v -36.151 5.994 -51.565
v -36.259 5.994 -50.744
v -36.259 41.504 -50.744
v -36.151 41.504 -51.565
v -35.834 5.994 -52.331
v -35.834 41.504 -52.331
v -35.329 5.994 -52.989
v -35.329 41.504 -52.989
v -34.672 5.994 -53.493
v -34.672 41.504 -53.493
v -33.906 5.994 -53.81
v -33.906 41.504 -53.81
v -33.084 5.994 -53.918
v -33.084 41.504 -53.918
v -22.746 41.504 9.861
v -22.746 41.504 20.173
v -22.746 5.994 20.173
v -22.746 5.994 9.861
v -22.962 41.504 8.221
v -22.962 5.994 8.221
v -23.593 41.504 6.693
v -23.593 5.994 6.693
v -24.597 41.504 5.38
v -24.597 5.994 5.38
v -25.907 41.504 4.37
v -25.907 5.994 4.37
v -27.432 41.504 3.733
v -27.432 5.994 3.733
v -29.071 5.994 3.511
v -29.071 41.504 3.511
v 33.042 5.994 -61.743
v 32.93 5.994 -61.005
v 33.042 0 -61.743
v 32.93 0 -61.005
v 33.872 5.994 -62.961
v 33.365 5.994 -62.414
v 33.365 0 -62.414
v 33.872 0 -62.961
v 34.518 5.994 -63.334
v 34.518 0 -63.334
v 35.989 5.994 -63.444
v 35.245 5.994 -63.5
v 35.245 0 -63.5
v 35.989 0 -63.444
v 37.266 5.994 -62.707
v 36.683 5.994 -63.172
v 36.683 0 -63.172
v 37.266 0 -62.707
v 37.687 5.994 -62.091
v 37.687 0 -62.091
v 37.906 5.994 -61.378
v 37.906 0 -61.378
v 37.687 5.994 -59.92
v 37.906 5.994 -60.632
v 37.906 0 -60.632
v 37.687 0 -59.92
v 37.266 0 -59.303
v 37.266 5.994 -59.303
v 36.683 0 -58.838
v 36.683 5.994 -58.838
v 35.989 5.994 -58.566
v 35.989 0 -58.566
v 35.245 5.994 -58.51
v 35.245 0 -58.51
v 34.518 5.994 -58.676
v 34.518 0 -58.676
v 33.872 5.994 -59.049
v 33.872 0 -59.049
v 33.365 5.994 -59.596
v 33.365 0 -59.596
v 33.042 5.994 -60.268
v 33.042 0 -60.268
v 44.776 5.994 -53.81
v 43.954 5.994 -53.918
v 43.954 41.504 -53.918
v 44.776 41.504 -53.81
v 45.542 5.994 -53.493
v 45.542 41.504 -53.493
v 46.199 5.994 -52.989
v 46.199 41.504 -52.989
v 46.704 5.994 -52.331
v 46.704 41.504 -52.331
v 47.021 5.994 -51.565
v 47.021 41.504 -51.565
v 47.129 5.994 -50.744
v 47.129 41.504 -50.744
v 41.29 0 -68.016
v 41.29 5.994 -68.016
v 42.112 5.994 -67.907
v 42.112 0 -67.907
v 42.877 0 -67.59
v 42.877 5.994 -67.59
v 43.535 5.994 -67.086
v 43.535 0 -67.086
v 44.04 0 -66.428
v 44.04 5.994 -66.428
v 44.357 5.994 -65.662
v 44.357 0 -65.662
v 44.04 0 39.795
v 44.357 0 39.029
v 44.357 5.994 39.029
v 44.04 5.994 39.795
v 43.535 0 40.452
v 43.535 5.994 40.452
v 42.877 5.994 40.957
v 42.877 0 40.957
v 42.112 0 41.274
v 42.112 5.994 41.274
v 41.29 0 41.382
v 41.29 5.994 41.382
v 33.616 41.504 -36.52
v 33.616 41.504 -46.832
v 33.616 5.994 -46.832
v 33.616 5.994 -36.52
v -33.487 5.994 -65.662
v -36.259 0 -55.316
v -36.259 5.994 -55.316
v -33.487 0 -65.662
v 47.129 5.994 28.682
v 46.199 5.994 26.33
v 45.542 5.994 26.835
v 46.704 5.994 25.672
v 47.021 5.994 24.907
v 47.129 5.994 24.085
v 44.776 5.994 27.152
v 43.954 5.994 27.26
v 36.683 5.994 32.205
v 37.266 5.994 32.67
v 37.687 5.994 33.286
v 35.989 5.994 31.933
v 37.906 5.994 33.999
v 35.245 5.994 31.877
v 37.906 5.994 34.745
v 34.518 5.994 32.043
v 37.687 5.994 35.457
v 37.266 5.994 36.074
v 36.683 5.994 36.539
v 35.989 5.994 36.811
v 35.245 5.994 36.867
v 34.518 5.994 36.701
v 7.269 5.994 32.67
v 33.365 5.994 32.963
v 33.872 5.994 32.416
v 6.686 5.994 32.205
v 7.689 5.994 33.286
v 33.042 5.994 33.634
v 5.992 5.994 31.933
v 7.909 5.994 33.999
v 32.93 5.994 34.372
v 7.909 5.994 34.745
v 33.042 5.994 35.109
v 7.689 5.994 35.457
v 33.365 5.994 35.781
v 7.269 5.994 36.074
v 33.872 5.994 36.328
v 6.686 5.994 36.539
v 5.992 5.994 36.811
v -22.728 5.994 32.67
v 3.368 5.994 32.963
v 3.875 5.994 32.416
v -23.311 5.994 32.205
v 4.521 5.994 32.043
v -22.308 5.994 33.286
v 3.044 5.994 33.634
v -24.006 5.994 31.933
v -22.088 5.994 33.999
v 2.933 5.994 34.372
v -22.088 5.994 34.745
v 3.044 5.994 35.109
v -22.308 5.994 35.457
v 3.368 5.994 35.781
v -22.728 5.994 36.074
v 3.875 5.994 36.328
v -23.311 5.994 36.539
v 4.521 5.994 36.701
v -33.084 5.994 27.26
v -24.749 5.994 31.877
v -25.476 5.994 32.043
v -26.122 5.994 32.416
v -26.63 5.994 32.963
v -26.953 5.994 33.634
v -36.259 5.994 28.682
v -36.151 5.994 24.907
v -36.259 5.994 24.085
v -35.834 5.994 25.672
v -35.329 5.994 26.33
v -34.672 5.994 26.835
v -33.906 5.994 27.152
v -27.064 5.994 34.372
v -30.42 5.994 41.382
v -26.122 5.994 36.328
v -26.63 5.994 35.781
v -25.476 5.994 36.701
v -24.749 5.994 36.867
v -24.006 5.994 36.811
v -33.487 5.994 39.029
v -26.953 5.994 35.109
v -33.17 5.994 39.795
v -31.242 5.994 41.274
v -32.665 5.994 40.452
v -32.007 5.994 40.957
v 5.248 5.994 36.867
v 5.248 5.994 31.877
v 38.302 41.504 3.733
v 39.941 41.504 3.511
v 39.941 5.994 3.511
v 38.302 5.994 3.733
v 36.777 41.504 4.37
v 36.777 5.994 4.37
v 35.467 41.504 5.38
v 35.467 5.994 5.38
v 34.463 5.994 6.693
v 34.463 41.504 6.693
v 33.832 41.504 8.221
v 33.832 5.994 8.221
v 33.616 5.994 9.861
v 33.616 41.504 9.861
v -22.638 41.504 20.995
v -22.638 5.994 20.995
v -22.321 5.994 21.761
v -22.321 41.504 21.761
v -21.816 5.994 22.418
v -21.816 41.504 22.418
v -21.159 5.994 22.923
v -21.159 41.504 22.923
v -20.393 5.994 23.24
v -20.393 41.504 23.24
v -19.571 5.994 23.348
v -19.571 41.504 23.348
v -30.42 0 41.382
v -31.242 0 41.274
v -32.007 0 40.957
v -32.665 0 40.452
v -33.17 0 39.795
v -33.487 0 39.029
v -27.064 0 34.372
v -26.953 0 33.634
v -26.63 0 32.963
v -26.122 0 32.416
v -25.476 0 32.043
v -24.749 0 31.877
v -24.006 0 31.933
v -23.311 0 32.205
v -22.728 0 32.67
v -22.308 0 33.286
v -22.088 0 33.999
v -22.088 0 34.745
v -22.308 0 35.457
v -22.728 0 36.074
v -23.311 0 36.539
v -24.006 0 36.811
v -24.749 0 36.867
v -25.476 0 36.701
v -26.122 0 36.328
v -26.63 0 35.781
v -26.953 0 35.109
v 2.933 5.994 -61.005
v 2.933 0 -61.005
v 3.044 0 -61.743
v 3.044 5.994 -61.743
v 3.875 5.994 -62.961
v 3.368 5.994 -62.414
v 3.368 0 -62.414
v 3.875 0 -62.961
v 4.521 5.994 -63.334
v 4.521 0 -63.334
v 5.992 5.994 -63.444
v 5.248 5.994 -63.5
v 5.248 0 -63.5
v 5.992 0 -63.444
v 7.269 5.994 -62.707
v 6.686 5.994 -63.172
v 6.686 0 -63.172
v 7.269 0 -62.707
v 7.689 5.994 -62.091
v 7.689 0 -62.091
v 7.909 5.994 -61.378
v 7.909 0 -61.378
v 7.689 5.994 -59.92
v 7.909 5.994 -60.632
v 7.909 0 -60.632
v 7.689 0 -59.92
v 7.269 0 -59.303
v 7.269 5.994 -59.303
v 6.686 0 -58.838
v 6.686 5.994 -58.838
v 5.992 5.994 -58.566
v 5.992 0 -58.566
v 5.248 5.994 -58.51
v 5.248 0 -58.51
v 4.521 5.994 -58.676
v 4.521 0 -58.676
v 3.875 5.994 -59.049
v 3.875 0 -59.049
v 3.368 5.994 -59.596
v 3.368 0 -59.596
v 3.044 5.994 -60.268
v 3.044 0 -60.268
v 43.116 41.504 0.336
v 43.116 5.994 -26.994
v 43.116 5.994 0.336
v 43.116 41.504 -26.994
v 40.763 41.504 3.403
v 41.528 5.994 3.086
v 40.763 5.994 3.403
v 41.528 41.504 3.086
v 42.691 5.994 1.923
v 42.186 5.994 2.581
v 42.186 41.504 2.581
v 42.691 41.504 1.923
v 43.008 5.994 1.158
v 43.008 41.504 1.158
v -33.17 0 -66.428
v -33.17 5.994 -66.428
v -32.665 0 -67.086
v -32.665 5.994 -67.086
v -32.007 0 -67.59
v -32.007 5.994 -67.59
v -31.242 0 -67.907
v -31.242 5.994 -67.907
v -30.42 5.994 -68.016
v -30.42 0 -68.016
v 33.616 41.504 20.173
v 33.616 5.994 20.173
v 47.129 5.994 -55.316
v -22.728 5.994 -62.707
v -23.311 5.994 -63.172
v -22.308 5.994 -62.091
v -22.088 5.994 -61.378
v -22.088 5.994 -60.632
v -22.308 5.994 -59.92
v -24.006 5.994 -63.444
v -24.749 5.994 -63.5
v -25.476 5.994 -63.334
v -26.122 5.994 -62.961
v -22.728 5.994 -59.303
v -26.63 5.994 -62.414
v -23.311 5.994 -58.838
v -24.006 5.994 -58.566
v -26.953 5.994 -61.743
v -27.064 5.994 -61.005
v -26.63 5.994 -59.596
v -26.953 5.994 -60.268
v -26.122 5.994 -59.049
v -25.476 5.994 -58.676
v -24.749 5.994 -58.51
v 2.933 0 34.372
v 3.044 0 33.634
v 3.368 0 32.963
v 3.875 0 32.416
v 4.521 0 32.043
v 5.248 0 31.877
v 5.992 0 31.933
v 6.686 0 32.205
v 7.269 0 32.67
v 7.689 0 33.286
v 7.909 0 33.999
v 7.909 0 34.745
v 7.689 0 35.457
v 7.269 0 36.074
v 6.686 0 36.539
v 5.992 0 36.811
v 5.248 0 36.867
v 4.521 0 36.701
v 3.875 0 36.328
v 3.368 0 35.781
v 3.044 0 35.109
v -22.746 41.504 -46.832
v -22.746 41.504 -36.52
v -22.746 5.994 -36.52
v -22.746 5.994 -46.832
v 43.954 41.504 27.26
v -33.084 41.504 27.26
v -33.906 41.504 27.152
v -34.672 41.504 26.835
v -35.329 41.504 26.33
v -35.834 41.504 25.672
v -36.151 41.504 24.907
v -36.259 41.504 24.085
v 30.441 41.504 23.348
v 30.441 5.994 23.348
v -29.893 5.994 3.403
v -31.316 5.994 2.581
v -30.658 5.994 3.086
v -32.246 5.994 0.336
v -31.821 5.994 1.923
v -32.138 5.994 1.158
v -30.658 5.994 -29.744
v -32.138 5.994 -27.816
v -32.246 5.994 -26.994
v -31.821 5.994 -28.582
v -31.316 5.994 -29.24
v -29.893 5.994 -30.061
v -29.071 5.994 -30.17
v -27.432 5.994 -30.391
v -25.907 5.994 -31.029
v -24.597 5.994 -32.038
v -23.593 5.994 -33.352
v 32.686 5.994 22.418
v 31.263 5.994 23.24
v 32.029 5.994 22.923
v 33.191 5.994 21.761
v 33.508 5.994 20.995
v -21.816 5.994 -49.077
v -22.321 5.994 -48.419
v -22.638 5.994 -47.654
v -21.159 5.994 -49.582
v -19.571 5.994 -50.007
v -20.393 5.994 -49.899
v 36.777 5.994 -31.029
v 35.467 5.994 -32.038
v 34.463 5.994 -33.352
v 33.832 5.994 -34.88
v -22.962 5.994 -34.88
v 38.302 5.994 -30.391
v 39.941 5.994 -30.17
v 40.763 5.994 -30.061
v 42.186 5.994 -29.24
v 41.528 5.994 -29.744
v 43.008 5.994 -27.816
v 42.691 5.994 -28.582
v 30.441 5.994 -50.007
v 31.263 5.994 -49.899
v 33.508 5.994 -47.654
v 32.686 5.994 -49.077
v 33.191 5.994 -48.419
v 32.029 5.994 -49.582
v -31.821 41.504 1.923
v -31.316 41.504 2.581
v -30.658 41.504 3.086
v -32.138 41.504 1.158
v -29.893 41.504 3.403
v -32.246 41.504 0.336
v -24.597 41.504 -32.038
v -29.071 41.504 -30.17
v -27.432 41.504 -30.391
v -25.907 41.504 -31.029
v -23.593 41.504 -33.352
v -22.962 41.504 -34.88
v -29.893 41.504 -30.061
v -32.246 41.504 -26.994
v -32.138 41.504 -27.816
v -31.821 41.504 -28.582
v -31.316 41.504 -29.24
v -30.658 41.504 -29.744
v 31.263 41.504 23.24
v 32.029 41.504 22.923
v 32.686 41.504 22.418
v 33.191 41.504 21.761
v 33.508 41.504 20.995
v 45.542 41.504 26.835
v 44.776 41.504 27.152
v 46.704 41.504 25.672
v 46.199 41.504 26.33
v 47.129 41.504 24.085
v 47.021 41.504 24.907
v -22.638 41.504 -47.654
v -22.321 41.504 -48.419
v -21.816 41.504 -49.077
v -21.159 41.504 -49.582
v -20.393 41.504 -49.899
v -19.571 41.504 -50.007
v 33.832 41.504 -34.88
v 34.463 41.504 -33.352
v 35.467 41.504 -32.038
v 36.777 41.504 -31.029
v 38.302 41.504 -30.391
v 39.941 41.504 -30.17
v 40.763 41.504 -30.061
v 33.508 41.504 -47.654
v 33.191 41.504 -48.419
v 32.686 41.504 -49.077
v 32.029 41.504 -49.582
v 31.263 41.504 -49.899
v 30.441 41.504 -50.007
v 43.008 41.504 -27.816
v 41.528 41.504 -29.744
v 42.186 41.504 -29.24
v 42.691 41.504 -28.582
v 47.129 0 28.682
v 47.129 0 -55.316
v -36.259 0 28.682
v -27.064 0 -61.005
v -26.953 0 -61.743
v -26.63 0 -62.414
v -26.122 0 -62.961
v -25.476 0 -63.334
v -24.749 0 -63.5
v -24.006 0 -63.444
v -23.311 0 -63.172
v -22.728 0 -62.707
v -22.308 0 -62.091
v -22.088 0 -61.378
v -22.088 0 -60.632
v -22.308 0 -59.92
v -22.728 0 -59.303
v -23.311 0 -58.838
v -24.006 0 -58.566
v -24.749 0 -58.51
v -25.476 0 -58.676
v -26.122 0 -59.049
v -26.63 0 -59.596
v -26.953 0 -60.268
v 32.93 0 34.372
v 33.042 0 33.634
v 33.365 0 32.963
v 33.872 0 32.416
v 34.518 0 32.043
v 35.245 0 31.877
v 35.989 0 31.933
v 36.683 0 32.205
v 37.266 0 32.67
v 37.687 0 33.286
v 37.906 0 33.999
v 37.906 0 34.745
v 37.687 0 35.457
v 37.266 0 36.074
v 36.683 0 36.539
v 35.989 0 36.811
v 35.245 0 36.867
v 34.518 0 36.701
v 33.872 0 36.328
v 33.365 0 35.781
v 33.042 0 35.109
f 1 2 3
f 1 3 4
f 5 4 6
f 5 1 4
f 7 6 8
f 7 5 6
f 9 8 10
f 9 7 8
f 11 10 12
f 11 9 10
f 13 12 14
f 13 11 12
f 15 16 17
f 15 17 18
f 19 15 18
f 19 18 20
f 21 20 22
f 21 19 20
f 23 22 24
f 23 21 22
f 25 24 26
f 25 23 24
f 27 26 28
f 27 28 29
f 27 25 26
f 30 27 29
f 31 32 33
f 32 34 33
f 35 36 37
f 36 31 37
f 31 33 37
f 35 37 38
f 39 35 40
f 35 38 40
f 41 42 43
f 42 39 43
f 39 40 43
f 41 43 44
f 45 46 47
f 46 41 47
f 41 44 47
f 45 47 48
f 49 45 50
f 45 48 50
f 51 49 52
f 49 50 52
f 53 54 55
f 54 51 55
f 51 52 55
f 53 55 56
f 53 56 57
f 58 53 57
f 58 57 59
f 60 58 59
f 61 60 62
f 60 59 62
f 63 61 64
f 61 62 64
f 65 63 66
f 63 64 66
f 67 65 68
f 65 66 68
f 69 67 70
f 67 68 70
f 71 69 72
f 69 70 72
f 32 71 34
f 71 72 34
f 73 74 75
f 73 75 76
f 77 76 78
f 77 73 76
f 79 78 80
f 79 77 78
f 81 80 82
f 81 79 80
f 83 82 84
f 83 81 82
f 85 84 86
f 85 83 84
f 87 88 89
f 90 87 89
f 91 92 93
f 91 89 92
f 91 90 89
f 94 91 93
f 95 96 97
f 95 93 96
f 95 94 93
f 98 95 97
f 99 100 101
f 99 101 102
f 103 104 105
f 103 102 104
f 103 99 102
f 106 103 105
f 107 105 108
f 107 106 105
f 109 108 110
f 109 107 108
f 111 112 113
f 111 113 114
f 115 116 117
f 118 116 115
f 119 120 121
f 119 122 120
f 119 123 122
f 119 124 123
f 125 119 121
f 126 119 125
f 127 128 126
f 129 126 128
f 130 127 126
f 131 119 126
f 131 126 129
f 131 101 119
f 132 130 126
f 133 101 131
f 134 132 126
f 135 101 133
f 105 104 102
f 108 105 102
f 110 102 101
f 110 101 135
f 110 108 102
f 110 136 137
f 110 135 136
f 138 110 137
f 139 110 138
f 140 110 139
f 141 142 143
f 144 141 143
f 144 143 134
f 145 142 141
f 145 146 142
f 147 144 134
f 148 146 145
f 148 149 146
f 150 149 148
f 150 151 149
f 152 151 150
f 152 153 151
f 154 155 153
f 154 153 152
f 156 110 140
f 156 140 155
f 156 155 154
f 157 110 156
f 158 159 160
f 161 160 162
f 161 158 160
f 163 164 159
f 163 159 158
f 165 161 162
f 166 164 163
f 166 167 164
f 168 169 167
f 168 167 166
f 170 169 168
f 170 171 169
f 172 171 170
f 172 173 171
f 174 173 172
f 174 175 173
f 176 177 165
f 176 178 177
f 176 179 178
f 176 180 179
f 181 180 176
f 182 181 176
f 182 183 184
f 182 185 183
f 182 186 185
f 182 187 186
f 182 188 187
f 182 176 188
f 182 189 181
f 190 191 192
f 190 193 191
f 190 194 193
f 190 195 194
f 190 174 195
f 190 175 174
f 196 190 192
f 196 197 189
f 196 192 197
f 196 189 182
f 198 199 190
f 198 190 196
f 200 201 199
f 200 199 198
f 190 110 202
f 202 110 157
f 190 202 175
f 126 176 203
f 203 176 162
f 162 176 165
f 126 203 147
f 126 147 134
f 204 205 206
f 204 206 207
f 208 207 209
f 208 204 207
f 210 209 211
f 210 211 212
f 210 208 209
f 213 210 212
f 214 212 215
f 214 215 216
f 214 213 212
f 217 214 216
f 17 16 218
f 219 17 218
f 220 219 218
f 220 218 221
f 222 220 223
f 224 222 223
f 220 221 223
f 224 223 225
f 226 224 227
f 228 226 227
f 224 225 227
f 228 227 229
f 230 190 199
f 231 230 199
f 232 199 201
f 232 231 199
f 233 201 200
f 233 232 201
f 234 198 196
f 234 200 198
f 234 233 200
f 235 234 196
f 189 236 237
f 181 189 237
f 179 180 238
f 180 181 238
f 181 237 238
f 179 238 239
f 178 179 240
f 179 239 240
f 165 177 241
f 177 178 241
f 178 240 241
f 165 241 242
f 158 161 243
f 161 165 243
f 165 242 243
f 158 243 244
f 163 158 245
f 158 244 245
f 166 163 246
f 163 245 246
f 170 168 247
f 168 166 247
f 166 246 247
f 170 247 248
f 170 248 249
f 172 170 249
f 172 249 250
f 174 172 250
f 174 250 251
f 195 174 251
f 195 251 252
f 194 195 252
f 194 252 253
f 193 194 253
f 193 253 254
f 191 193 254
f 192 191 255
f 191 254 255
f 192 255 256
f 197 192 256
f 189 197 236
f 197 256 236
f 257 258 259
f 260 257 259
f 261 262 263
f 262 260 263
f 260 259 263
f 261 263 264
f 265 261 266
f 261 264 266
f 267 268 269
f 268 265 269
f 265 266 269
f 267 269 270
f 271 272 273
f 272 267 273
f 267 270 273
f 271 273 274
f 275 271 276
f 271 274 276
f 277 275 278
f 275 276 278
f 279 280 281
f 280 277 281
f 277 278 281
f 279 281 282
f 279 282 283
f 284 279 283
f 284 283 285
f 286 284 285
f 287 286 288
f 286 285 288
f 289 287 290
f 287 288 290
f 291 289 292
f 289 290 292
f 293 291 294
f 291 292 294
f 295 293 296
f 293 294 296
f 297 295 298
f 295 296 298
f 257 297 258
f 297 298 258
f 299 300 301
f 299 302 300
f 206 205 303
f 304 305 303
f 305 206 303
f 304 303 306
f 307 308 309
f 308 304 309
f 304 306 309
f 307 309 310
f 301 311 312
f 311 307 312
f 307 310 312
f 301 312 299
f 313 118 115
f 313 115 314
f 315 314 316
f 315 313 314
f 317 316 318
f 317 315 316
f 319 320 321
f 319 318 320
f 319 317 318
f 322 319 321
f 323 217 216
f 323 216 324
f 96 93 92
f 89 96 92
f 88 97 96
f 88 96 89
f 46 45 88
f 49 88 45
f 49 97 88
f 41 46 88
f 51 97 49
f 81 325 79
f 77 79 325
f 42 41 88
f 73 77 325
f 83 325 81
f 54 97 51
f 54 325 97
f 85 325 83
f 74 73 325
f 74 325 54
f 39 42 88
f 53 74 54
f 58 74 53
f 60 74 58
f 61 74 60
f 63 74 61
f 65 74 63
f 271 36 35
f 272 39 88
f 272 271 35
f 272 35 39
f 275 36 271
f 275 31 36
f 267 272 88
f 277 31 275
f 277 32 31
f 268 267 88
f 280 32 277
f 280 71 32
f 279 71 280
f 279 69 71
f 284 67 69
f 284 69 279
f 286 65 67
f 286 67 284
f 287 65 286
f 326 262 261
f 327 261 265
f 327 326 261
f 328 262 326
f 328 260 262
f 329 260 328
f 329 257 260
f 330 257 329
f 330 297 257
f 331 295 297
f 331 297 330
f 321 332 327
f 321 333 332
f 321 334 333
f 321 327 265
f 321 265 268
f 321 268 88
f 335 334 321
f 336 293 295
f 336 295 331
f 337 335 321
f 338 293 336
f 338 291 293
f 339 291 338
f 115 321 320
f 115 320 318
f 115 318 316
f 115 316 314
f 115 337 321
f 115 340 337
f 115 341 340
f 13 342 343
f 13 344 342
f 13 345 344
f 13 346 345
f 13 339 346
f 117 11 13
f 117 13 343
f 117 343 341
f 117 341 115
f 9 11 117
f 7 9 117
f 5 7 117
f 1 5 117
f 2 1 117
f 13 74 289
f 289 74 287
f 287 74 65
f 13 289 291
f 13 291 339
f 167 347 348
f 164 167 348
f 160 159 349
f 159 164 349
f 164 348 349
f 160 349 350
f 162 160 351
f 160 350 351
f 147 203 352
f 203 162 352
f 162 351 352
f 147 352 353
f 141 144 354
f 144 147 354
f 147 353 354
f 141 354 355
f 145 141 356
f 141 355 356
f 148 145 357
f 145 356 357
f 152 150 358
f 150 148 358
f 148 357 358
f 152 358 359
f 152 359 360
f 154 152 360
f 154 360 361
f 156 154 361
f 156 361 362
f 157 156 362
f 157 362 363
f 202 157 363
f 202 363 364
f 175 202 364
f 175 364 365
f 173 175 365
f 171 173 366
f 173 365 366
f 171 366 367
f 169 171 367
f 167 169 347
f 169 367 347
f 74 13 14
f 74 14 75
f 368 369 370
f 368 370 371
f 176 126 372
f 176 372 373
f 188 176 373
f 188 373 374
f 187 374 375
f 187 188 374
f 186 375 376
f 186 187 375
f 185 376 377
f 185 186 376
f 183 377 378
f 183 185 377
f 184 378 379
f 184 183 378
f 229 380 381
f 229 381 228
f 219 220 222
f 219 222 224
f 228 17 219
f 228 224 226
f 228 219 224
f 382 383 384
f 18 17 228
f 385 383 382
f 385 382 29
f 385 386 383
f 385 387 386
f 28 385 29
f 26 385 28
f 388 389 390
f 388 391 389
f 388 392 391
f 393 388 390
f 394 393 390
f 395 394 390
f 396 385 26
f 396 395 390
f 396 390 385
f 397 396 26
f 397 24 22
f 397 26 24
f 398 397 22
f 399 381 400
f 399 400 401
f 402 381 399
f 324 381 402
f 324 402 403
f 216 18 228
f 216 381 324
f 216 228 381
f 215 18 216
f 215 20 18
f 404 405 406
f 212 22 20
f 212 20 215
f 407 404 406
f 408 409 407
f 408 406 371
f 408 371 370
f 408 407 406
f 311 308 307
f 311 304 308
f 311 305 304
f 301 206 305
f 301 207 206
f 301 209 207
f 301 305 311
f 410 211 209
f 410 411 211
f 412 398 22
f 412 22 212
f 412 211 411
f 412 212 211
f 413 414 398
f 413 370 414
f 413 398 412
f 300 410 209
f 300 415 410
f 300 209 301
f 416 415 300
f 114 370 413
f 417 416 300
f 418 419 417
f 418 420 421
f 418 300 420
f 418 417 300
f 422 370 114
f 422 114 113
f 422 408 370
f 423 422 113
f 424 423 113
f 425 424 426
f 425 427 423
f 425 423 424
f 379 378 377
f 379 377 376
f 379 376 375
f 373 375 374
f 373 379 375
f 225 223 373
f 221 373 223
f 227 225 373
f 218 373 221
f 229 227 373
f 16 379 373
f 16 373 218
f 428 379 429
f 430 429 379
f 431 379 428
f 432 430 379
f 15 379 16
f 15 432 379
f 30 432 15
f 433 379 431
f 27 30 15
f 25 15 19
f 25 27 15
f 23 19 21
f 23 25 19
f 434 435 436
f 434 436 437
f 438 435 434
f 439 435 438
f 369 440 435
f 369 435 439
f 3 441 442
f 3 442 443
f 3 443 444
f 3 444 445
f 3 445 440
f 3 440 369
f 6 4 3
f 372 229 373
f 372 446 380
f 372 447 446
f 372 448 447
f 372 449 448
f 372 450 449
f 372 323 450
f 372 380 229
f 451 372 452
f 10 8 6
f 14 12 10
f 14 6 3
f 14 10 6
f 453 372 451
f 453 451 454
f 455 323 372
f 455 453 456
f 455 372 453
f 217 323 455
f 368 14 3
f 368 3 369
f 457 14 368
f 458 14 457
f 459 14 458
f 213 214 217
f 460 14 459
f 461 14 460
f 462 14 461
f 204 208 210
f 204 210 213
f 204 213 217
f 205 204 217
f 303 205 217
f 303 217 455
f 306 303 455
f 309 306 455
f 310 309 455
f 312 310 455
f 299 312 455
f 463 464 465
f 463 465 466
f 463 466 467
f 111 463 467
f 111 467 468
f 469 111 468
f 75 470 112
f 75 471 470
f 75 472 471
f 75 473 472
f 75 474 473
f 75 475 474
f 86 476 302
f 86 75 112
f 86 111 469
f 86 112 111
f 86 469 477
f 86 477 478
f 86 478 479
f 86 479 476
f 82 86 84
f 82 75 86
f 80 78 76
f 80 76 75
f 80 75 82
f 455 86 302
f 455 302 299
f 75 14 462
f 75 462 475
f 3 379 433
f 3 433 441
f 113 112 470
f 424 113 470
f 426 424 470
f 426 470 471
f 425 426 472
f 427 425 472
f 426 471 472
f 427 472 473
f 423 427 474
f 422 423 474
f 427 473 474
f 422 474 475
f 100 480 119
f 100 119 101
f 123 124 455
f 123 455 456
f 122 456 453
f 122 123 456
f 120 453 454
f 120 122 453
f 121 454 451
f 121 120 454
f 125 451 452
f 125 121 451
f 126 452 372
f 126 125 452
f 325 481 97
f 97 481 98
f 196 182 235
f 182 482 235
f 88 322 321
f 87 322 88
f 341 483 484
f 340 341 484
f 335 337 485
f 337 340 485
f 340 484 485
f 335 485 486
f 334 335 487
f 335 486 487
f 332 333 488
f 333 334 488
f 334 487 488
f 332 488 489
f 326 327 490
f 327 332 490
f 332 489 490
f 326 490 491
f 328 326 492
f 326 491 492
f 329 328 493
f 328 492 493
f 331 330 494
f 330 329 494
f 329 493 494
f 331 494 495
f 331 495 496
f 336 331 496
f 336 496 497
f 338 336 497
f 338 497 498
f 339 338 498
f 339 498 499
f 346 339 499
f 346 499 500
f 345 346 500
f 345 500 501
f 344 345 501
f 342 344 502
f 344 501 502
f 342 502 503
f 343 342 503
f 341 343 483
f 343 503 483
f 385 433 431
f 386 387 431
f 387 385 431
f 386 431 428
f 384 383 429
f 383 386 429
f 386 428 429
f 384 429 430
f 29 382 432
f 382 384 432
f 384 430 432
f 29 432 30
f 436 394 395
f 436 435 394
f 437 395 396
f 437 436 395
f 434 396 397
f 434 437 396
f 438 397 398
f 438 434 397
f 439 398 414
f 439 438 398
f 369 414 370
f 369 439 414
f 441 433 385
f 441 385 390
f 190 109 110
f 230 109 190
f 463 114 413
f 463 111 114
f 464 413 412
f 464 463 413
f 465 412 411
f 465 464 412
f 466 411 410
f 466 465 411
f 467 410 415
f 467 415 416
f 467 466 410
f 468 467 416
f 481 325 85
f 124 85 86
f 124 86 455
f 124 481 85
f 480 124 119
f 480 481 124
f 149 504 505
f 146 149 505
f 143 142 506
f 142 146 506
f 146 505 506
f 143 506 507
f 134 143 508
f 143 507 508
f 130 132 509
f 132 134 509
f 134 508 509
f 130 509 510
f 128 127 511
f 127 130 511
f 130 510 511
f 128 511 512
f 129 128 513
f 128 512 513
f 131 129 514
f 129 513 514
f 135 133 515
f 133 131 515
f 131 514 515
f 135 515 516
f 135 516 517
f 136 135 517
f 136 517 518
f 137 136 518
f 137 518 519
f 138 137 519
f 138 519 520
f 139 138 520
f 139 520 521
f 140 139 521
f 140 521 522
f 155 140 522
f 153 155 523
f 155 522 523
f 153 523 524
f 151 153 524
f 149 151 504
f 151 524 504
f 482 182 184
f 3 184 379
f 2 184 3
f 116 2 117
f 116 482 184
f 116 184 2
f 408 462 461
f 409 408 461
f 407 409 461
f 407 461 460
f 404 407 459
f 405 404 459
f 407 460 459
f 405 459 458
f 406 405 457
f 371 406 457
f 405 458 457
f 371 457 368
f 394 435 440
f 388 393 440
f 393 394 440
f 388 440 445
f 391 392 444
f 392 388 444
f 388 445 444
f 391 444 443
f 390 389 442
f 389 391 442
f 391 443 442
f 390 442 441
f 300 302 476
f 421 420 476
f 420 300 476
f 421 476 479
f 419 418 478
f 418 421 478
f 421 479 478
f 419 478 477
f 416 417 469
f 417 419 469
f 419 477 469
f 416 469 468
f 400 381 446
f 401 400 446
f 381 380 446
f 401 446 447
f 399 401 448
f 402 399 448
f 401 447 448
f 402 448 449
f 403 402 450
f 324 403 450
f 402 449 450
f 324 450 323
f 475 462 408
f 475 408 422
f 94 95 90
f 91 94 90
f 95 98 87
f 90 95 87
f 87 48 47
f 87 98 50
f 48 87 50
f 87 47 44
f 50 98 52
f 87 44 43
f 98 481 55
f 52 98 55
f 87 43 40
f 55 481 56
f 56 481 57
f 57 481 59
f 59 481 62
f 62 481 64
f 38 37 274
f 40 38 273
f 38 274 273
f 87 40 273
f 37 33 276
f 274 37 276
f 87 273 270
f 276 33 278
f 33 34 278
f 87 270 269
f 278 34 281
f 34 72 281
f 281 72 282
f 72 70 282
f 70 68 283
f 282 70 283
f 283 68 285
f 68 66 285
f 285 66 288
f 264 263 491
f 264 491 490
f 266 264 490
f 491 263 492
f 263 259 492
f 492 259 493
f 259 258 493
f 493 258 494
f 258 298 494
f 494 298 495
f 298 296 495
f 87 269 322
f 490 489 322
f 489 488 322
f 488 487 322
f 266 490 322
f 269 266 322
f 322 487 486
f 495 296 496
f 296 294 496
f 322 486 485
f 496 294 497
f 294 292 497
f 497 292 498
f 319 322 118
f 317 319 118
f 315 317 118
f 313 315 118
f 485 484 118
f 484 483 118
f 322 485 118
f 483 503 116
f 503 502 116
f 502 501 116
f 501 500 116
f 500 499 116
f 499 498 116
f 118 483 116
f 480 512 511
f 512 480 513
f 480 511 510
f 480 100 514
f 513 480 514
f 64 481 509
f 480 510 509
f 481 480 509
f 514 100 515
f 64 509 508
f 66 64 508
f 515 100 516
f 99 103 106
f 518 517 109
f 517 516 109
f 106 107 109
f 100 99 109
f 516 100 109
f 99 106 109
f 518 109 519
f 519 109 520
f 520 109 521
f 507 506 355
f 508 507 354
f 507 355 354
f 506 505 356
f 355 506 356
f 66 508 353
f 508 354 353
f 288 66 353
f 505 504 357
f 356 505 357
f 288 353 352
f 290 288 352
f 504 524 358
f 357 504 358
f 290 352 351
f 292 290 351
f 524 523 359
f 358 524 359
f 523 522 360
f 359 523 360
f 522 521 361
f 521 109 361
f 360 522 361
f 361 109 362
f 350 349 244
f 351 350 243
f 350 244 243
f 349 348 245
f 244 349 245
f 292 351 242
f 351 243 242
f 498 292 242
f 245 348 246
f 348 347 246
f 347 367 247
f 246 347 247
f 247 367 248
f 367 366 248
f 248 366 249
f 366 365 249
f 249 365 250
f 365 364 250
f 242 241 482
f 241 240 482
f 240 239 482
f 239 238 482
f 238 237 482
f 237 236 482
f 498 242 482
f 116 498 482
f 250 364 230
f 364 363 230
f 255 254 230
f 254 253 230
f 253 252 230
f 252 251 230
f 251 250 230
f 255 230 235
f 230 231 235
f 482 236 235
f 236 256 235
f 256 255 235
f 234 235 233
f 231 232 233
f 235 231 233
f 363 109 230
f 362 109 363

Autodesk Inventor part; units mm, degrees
ref_plane "YZ Plane" through (0, 0, 0) normal (1, 0, 0) x (0, 1, 0)
ref_plane "XZ Plane" through (0, 0, 0) normal (0, 1, 0) x (-1, 0, 0)
ref_plane "XY Plane" through (0, 0, 0) normal (0, 0, 1) x (1, 0, 0)
sketch "Sketch1" plane through (0, 0, 0) normal (0, 1, 0) x (-1, 0, 0)
  line L0 (-41.2899, 41.3823) -> (30.4199, 41.3823)
  line L1 (36.2591, 28.6823) -> (36.2591, -55.3155)
  line L2 (30.4199, -68.0155) -> (-41.2899, -68.0155)
  line L3 (-47.1291, -55.3155) -> (-47.1291, 28.6823)
  line L4 (-47.1291, 28.6823) -> (36.2591, 28.6823)
  line L5 (-47.1291, -55.3155) -> (36.2591, -55.3155)
  line L6 (36.2591, -55.3155) -> (33.4867, -65.6622)
  line L7 (-47.1291, -55.3155) -> (-44.3567, -65.6622)
  line L8 (-47.1291, 28.6823) -> (-44.3567, 39.0291)
  line L9 (36.2591, 28.6823) -> (33.4867, 39.0291)
  arc A0 (-44.3567, -65.6622) -> (-41.2899, -68.0155) centre (-41.2899, -64.8405) ccw
  arc A1 (30.4199, -68.0155) -> (33.4867, -65.6622) centre (30.4199, -64.8405) ccw
  arc A2 (33.4867, 39.0291) -> (30.4199, 41.3823) centre (30.4199, 38.2073) ccw
  arc A3 (-41.2899, 41.3823) -> (-44.3567, 39.0291) centre (-41.2899, 38.2073) ccw
  circle A4 centre (-35.4324, -61.0051) radius 2.5019
  circle A5 centre (24.5624, -61.0051) radius 2.5019
  circle A6 centre (-35.4324, 34.3719) radius 2.5019
  circle A7 centre (24.5624, 34.3719) radius 2.5019
  line L10 (-5.435, 41.3823) -> (-5.435, -68.0155) construction
  circle A8 centre (-5.435, 34.3719) radius 2.5019
  circle A9 centre (-5.435, -61.0051) radius 2.5019
  point P0 (0, 0)
  dimension "d2" = 12.7
  dimension "d3" = 12.7
  dimension "d4" = 15
  dimension "d5" = 15
  dimension "d6" = 15
  dimension "d7" = 83.3882
  dimension "d8" = 109.3978
  dimension "d9" = 3.175
  dimension "d10" = 7.0104
  dimension "d11" = 7.0104
  dimension "d12" = 7.0104
  dimension "d13" = 7.0104
  dimension "d14" = 59.9948
  dimension "d15" = 59.9948
  dimension "d16" = 5.0038
  dimension "d17" = 5.0038
  dimension "d18" = 5.0038
  dimension "d19" = 5.0038
  dimension "d20" = 29.9974
  dimension "d21" = 29.9974
  dimension "d42" = 5.0038
  dimension "d43" = 5.0038
extrude "Extrusion1" add sketch "Sketch1" along normal blind 5.9944
sketch "Sketch2" plane through (0, 5.9944, 0) normal (0, 1, 0) x (1, 0, 0)
  line L0 (47.1291, -28.6823) -> (47.1291, 55.3155) projected
  line L1 (41.2899, 68.0155) -> (-30.4199, 68.0155) projected
  line L2 (-36.2591, 55.3155) -> (-36.2591, -28.6823) projected
  line L3 (-33.0841, 53.9185) -> (43.9541, 53.9185)
  line L4 (47.1291, 50.7435) -> (47.1291, -24.0849)
  line L5 (43.9541, -27.2599) -> (-33.0841, -27.2599)
  line L6 (-36.2591, -24.0849) -> (-36.2591, 50.7435)
  arc A0 (-36.2591, -24.0849) -> (-33.0841, -27.2599) centre (-33.0841, -24.0849) ccw
  arc A1 (43.9541, -27.2599) -> (47.1291, -24.0849) centre (43.9541, -24.0849) ccw
  arc A2 (47.1291, 50.7435) -> (43.9541, 53.9185) centre (43.9541, 50.7435) ccw
  arc A3 (-33.0841, 53.9185) -> (-36.2591, 50.7435) centre (-33.0841, 50.7435) ccw
  point P0 (0, 0)
  point P1 (-36.2591, 53.9185)
  point P2 (47.1291, -27.2599)
  dimension "d25" = 81.1784
  dimension "d26" = 14.097
  dimension "d27" = 3.175
extrude "Extrusion2" add sketch "Sketch2" along normal blind 35.5092
sketch "Sketch3" plane through (0, 41.5036, 0) normal (0, 1, 0) x (1, 0, 0)
  line L0 (-36.2591, 50.7435) -> (-36.2591, -24.0849) projected
  line L1 (43.9541, 53.9185) -> (-33.0841, 53.9185) projected
  line L2 (43.1159, 26.9945) -> (43.1159, -0.3359)
  line L3 (-32.2459, -0.3359) -> (-32.2459, 26.9945)
  line L4 (-19.5713, 50.0069) -> (30.4413, 50.0069)
  line L5 (30.4413, -23.3483) -> (-19.5713, -23.3483)
  arc A0 (33.6163, 46.8319) -> (30.4413, 50.0069) centre (30.4413, 46.8319) ccw
  arc A1 (-19.5713, 50.0069) -> (-22.7463, 46.8319) centre (-19.5713, 46.8319) ccw
  arc A2 (-22.7463, -20.1733) -> (-19.5713, -23.3483) centre (-19.5713, -20.1733) ccw
  arc A3 (30.4413, -23.3483) -> (33.6163, -20.1733) centre (30.4413, -20.1733) ccw
  arc A4 (-32.2459, -0.3359) -> (-29.0709, -3.5109) centre (-29.0709, -0.3359) ccw
  arc A5 (-29.0709, 30.1695) -> (-32.2459, 26.9945) centre (-29.0709, 26.9945) ccw
  arc A6 (43.1159, 26.9945) -> (39.9409, 30.1695) centre (39.9409, 26.9945) ccw
  arc A7 (39.9409, -3.5109) -> (43.1159, -0.3359) centre (39.9409, -0.3359) ccw
  line L6 (33.6163, 46.8319) -> (33.6163, 36.5195)
  line L7 (33.6163, -9.8609) -> (33.6163, -20.1733)
  line L8 (-22.7463, -20.1733) -> (-22.7463, -9.8609)
  line L9 (-22.7463, 36.5195) -> (-22.7463, 46.8319)
  line L10 (39.9409, -3.5109) -> (39.9663, -3.5109)
  line L11 (-29.0963, -3.5109) -> (-29.0709, -3.5109)
  line L12 (-29.0709, 30.1695) -> (-29.0963, 30.1695)
  line L13 (39.9663, 30.1695) -> (39.9409, 30.1695)
  arc A8 (39.9663, -3.5109) -> (33.6163, -9.8609) centre (39.9663, -9.8609) ccw
  arc A9 (33.6163, 36.5195) -> (39.9663, 30.1695) centre (39.9663, 36.5195) ccw
  arc A10 (-29.0963, 30.1695) -> (-22.7463, 36.5195) centre (-29.0963, 36.5195) ccw
  arc A11 (-22.7463, -9.8609) -> (-29.0963, -3.5109) centre (-29.0963, -9.8609) ccw
  point P0 (0, 0)
  point P1 (43.1159, -3.5109)
  point P2 (43.1159, 30.1695)
  point P3 (-32.2459, -3.5109)
  point P4 (-22.7463, 50.0069)
  point P5 (33.6163, -23.3483)
  point P6 (33.6163, 50.0069)
  dimension "d30" = 56.3626
  dimension "d31" = 33.6804
  dimension "d32" = 73.3552
  dimension "d35" = 75.3618
  dimension "d36" = 4.0132
  dimension "d37" = 3.9116
  dimension "d38" = 3.175
  dimension "d39" = 6.35
extrude "Extrusion3" cut sketch "Sketch3" against normal blind 35.5092
properties part number "NEAMBox"
